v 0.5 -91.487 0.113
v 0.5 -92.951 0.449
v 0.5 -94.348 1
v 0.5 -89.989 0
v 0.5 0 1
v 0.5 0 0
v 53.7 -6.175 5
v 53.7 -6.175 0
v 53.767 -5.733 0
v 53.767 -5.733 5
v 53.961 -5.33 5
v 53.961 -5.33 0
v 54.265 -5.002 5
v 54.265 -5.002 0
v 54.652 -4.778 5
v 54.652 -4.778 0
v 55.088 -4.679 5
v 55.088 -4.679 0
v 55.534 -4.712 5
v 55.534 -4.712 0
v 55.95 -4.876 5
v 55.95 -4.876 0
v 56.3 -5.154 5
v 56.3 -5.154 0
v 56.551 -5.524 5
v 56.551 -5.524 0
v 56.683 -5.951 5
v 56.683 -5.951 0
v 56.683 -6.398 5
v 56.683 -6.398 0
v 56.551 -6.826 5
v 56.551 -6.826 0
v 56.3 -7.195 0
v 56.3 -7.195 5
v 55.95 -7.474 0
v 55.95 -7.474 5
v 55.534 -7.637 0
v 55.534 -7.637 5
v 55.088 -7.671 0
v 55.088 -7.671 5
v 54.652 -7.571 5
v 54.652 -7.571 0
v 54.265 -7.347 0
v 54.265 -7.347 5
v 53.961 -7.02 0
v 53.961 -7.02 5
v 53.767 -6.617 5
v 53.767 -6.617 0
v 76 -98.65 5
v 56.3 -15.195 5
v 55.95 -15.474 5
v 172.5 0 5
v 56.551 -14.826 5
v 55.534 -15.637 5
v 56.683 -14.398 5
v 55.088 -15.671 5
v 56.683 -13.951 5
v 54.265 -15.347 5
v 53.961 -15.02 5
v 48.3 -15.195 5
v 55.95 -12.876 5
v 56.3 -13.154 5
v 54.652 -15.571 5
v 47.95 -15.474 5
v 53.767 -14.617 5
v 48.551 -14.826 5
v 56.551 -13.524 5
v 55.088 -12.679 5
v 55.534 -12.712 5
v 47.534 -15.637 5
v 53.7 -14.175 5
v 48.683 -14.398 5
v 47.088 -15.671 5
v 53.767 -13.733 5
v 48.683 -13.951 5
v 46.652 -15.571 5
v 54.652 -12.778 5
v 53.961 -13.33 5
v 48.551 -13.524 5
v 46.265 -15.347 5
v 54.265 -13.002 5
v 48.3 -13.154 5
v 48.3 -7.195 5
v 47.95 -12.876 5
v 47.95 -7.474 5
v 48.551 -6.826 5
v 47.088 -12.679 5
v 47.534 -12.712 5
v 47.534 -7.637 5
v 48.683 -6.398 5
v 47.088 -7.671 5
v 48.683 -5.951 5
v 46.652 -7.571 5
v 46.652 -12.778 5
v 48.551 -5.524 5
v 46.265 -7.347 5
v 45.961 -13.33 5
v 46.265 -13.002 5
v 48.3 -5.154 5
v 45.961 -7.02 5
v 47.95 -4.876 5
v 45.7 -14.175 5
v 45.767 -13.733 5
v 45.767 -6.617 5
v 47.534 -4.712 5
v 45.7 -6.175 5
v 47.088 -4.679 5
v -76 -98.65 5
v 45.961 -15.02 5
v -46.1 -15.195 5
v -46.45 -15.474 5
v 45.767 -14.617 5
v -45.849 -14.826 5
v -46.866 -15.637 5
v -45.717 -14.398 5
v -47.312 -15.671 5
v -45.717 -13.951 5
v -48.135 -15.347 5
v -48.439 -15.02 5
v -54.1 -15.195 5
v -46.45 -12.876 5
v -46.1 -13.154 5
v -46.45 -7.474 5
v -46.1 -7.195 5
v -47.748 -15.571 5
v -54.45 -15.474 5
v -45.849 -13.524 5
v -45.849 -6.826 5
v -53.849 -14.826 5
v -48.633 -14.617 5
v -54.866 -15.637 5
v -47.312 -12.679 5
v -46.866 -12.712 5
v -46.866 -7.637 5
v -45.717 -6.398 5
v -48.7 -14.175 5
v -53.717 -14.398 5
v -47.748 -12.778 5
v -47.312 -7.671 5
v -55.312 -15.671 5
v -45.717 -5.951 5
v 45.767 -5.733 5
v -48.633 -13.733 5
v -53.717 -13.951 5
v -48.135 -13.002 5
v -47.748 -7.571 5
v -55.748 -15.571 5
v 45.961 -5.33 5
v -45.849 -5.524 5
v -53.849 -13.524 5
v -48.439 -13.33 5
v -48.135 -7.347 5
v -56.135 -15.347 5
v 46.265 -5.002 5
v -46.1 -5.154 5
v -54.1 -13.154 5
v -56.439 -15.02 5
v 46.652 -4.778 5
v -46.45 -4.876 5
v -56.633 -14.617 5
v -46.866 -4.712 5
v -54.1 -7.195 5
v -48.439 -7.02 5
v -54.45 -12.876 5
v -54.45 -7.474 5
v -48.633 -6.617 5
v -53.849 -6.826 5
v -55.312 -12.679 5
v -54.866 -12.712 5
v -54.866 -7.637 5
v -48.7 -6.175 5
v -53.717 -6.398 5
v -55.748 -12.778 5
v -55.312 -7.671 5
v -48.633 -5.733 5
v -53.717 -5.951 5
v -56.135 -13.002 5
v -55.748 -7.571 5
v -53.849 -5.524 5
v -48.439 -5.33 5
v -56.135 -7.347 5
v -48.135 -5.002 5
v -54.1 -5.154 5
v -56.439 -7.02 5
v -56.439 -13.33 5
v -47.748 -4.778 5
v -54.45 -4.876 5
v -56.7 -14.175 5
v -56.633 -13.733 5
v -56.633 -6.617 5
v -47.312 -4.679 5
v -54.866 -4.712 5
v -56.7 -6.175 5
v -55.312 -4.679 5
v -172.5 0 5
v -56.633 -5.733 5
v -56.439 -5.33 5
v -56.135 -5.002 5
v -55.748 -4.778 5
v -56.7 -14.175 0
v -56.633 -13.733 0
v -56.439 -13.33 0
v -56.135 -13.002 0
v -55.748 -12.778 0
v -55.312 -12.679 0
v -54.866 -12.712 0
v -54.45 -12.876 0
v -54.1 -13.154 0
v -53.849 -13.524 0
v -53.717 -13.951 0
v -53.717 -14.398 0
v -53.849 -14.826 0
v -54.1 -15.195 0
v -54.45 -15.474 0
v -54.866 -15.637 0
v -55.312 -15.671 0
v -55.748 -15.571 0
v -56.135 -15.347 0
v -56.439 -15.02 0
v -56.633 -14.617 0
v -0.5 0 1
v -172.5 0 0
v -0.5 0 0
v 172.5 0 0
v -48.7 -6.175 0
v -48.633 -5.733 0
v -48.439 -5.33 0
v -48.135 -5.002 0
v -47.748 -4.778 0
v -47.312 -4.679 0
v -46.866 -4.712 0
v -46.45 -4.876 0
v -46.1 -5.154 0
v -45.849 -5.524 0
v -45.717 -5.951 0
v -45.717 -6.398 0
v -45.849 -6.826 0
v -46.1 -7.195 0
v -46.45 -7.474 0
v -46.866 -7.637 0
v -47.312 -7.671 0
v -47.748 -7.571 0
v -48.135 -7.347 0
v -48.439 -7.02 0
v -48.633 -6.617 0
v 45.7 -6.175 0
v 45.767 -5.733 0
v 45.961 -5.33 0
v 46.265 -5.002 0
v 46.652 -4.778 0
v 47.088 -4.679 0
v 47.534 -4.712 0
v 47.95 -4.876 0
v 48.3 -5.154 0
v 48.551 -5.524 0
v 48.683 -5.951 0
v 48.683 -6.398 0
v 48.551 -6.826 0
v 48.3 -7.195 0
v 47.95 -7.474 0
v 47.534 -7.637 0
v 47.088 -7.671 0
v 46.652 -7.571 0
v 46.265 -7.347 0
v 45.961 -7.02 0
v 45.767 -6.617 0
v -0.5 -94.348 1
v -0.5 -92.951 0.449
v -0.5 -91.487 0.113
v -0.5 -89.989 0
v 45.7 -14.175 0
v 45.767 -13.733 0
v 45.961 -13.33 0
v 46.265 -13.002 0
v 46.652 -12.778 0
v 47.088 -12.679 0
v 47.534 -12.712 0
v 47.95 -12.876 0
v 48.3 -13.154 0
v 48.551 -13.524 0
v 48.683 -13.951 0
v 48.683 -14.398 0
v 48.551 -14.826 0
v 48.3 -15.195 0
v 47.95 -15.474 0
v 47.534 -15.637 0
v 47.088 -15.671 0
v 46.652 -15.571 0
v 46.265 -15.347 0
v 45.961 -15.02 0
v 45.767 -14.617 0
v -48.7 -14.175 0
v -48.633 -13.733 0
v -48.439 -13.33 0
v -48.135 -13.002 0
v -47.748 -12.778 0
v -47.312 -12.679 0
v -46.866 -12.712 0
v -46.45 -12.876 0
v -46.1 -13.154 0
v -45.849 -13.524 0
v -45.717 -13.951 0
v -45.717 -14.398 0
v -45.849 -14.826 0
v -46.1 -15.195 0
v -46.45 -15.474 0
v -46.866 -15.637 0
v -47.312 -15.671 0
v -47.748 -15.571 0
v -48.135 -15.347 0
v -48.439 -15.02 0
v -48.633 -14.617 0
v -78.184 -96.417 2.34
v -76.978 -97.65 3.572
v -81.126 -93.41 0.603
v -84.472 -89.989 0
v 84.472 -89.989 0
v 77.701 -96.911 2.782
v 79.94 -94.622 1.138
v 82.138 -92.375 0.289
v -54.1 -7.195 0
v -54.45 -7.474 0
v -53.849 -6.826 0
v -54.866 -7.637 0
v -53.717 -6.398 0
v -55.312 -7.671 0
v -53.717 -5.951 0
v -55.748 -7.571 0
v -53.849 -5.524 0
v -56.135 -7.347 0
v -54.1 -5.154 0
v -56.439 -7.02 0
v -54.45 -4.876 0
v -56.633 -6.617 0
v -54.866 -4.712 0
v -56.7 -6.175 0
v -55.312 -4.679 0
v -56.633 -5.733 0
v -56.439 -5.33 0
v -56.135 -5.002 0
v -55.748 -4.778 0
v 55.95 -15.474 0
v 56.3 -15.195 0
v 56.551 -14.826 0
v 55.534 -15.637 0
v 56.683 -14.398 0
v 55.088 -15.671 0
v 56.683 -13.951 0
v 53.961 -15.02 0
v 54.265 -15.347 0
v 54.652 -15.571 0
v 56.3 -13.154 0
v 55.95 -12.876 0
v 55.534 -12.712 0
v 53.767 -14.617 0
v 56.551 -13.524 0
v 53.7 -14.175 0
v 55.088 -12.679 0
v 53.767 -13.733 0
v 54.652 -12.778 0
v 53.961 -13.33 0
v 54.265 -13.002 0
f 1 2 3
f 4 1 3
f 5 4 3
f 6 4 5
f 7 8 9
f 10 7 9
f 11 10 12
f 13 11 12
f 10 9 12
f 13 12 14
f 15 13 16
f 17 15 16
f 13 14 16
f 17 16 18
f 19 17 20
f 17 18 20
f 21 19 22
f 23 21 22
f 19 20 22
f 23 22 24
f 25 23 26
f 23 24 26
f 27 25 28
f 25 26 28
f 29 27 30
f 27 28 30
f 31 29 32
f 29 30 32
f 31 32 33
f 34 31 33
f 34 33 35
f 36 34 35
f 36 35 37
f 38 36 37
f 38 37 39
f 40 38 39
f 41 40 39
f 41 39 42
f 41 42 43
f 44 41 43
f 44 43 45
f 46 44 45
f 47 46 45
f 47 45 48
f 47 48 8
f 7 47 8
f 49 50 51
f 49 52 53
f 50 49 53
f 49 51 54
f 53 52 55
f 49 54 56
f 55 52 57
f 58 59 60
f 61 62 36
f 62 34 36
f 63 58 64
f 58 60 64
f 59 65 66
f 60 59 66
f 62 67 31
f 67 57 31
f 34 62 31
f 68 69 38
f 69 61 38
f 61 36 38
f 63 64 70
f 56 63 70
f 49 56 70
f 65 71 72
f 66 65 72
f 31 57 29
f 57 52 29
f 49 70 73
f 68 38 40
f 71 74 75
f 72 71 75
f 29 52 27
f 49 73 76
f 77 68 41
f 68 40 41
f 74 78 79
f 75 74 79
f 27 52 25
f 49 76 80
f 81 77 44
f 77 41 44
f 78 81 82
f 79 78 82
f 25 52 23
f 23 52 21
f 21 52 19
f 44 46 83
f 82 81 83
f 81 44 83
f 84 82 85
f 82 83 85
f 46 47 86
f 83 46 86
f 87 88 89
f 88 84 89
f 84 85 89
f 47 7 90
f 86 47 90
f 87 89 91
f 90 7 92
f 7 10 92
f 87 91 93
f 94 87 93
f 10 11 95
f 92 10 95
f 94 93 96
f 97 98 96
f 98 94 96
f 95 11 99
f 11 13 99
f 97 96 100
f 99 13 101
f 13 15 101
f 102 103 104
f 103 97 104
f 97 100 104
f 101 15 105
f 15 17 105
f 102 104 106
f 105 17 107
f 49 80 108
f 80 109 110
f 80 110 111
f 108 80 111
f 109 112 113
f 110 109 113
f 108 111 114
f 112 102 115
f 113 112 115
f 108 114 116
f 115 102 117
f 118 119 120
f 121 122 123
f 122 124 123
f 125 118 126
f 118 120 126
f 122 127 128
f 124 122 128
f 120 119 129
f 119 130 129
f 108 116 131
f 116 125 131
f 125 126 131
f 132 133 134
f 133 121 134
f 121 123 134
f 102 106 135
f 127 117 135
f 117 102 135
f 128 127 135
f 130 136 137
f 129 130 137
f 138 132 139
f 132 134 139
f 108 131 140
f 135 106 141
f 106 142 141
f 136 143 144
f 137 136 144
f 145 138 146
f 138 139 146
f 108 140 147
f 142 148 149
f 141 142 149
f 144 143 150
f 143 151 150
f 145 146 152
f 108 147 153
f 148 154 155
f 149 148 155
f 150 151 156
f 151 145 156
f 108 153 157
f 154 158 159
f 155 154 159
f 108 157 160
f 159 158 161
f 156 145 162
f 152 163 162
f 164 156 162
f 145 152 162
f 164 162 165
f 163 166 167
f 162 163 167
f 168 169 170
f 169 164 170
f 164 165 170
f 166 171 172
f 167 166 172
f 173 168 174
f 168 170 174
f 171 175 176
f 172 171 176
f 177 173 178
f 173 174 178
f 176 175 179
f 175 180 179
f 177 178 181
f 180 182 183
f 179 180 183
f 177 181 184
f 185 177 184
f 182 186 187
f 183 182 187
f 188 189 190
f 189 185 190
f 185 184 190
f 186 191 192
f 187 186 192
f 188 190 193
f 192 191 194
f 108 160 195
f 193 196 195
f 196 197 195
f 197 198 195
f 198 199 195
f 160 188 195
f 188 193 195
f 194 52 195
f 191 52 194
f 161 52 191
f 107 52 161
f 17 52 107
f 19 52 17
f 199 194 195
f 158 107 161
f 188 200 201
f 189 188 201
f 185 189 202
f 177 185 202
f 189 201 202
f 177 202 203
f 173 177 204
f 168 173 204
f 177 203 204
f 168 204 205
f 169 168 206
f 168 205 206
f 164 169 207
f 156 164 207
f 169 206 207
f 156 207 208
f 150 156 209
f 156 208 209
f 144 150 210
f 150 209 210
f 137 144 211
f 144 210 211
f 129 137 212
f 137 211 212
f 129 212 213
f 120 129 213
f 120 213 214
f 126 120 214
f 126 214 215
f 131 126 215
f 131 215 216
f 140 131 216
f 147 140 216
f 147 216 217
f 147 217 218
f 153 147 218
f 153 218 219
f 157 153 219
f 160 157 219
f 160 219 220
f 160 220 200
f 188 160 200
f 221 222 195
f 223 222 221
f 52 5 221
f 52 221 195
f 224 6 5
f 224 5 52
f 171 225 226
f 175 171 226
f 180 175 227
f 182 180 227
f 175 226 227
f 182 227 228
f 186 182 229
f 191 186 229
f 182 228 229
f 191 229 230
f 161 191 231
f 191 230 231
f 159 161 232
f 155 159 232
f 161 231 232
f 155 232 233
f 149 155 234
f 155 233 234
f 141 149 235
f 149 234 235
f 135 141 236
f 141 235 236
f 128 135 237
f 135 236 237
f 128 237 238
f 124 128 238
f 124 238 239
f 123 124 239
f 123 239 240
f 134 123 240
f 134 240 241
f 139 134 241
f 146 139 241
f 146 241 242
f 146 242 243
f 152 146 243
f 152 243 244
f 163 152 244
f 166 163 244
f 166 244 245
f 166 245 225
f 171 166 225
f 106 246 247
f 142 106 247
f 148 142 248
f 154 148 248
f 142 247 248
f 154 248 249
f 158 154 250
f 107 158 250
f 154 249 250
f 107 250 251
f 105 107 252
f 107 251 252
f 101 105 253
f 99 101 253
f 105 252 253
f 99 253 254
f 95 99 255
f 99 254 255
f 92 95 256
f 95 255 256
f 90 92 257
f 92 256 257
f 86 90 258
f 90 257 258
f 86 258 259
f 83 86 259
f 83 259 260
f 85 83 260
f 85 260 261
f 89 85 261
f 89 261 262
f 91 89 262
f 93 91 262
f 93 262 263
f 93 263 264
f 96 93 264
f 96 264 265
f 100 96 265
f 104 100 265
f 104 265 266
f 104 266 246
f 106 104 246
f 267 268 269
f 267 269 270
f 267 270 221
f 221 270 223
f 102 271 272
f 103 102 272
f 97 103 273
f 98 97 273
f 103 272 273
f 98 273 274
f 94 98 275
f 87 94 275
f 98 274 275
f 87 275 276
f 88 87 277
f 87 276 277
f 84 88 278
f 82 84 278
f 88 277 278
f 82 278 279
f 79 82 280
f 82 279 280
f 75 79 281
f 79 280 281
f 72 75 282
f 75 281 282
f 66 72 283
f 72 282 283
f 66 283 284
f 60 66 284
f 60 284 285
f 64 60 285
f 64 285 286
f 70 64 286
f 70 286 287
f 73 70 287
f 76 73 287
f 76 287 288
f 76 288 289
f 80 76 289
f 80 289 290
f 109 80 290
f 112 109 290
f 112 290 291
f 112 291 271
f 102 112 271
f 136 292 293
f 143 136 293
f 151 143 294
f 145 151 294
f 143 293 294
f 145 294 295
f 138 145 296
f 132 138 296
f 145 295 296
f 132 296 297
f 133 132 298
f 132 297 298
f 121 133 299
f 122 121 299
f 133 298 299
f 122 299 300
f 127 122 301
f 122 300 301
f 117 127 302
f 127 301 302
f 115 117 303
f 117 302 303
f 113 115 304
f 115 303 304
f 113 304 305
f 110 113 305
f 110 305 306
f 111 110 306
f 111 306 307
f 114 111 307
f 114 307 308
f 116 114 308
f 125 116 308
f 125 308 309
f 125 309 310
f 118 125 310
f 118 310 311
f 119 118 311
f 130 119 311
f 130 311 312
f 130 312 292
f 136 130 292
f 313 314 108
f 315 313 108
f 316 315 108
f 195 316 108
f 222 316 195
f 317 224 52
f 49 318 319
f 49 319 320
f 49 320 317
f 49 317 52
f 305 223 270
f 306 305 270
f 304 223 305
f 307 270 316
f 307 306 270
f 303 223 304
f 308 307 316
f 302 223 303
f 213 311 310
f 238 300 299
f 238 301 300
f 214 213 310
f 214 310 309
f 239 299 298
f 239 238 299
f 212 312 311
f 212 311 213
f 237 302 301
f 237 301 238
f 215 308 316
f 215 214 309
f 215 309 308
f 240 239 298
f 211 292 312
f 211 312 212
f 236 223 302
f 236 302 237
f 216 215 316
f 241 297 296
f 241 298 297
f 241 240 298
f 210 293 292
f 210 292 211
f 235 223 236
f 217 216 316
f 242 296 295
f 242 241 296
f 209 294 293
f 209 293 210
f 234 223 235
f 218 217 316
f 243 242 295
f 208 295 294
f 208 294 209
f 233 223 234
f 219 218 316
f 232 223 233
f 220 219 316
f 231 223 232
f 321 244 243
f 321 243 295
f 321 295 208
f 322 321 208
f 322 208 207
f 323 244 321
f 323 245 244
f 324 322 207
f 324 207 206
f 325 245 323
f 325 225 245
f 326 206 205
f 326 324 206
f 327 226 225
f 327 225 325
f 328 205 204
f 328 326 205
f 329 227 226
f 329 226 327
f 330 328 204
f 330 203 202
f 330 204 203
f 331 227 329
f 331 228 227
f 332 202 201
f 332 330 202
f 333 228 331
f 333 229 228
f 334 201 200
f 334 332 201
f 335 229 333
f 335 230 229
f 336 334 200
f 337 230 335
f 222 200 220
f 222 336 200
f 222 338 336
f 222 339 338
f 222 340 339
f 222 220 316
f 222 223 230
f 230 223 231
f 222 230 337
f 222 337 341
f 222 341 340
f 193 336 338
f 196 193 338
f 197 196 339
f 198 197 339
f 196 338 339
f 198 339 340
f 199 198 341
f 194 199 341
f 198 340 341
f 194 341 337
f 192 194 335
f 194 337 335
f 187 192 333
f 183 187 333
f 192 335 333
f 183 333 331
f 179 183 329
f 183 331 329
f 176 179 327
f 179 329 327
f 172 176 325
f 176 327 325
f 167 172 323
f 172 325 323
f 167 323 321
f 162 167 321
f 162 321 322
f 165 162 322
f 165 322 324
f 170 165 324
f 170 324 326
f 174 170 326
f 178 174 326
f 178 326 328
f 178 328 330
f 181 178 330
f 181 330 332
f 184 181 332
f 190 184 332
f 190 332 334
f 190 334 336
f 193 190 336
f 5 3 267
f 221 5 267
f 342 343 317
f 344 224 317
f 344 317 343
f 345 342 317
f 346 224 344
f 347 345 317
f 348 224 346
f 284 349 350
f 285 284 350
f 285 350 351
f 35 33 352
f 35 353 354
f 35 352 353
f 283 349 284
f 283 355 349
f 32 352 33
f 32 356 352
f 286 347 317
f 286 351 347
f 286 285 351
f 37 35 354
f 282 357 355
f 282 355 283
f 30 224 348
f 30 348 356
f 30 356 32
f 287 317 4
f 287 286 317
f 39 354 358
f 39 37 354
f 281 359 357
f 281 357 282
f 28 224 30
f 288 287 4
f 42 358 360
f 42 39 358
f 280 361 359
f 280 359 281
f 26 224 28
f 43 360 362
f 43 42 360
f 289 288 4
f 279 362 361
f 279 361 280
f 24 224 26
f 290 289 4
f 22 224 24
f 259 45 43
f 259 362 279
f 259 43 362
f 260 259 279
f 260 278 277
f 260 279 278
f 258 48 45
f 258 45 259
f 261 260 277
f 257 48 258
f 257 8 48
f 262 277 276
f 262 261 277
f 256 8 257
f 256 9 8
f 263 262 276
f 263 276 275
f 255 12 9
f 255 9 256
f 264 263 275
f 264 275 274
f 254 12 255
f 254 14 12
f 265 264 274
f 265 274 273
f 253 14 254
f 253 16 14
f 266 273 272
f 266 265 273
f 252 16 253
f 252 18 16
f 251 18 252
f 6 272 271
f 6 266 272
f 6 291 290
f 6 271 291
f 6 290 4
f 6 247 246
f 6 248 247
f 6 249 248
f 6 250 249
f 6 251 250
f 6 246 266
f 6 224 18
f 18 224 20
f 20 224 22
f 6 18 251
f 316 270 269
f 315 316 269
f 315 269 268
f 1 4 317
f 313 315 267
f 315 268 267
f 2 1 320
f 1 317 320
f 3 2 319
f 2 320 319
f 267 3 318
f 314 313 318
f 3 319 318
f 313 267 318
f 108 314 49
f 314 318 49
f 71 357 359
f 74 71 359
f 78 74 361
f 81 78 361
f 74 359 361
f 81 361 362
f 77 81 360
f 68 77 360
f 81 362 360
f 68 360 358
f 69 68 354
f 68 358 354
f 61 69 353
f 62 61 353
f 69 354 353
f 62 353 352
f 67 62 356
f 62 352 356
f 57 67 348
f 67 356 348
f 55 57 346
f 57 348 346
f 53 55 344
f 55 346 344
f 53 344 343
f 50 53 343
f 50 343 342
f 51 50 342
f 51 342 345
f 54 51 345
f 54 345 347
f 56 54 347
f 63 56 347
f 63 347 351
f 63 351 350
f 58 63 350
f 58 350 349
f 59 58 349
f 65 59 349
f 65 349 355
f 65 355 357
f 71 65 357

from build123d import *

# Parameters (mm, degrees)
EXTRUDE_1_DEPTH     = 5
SKETCH_3_W          = 1
SKETCH_3_H          = 224.141744844
CUT_EXTRUDE_2_DEPTH = 1
FILLET_1_R          = 10
SKETCH_7_R          = 1.5
CUT_EXTRUDE_3_DEPTH = 10


with BuildPart() as part:
    # 草图1 → 凸台-拉伸1 (new body)
    with BuildSketch(Plane.XY):
        Polygon((-172.5, 0), (172.5, 0), (76, -98.649632539), (-76, -98.649632539), align=None)
    extrude(amount=EXTRUDE_1_DEPTH)

    # 草图3 → 切除-拉伸2 (cut)
    with BuildSketch(Plane(origin=(0, 0, 0), x_dir=(-1, 0, 0), z_dir=(0, 0, -1))):
        with Locations((0, -49.835742657)):
            Rectangle(SKETCH_3_W, SKETCH_3_H)
    extrude(amount=-CUT_EXTRUDE_2_DEPTH, mode=Mode.SUBTRACT)

    # 圆角1
    # the kernel refuses this fillet: 10 mm, written as the material it takes off along each edge
    with BuildSketch(Plane(origin=(97.650635095, -98.649632539, 0), x_dir=(0, 1, 0), z_dir=(-1, 0, 0)), Plane(origin=(21.150635095, -98.649632539, 0), x_dir=(0, 1, 0), z_dir=(-1, 0, 0))) as fillet_1_piece_1:
        with BuildLine():
            CenterArc((8.660254038, -10), FILLET_1_R, 90, 60)
            Line((0, -5), (0, 0))
            Line((0, 0), (8.660254038, 0))
        make_face()
    extrude(amount=118.801270189, mode=Mode.SUBTRACT)

    # 草图7 → 切除-拉伸3 (cut)
    with BuildSketch(Plane(origin=(0, 0, 0), x_dir=(-1, 0, 0), z_dir=(0, 0, -1))):
        with Locations((55.2, -14.174704167)):
            Circle(SKETCH_7_R)
        with Locations((47.2, -14.174704167)):
            Circle(SKETCH_7_R)
        with Locations((47.2, -6.174704167)):
            Circle(SKETCH_7_R)
        with Locations((55.2, -6.174704167)):
            Circle(SKETCH_7_R)
        with Locations((-55.2, -6.174704167)):
            Circle(SKETCH_7_R)
        with Locations((-55.2, -14.174704167)):
            Circle(SKETCH_7_R)
        with Locations((-47.2, -14.174704167)):
            Circle(SKETCH_7_R)
        with Locations((-47.2, -6.174704167)):
            Circle(SKETCH_7_R)
    extrude(amount=-CUT_EXTRUDE_3_DEPTH, mode=Mode.SUBTRACT)


solid = part.part
